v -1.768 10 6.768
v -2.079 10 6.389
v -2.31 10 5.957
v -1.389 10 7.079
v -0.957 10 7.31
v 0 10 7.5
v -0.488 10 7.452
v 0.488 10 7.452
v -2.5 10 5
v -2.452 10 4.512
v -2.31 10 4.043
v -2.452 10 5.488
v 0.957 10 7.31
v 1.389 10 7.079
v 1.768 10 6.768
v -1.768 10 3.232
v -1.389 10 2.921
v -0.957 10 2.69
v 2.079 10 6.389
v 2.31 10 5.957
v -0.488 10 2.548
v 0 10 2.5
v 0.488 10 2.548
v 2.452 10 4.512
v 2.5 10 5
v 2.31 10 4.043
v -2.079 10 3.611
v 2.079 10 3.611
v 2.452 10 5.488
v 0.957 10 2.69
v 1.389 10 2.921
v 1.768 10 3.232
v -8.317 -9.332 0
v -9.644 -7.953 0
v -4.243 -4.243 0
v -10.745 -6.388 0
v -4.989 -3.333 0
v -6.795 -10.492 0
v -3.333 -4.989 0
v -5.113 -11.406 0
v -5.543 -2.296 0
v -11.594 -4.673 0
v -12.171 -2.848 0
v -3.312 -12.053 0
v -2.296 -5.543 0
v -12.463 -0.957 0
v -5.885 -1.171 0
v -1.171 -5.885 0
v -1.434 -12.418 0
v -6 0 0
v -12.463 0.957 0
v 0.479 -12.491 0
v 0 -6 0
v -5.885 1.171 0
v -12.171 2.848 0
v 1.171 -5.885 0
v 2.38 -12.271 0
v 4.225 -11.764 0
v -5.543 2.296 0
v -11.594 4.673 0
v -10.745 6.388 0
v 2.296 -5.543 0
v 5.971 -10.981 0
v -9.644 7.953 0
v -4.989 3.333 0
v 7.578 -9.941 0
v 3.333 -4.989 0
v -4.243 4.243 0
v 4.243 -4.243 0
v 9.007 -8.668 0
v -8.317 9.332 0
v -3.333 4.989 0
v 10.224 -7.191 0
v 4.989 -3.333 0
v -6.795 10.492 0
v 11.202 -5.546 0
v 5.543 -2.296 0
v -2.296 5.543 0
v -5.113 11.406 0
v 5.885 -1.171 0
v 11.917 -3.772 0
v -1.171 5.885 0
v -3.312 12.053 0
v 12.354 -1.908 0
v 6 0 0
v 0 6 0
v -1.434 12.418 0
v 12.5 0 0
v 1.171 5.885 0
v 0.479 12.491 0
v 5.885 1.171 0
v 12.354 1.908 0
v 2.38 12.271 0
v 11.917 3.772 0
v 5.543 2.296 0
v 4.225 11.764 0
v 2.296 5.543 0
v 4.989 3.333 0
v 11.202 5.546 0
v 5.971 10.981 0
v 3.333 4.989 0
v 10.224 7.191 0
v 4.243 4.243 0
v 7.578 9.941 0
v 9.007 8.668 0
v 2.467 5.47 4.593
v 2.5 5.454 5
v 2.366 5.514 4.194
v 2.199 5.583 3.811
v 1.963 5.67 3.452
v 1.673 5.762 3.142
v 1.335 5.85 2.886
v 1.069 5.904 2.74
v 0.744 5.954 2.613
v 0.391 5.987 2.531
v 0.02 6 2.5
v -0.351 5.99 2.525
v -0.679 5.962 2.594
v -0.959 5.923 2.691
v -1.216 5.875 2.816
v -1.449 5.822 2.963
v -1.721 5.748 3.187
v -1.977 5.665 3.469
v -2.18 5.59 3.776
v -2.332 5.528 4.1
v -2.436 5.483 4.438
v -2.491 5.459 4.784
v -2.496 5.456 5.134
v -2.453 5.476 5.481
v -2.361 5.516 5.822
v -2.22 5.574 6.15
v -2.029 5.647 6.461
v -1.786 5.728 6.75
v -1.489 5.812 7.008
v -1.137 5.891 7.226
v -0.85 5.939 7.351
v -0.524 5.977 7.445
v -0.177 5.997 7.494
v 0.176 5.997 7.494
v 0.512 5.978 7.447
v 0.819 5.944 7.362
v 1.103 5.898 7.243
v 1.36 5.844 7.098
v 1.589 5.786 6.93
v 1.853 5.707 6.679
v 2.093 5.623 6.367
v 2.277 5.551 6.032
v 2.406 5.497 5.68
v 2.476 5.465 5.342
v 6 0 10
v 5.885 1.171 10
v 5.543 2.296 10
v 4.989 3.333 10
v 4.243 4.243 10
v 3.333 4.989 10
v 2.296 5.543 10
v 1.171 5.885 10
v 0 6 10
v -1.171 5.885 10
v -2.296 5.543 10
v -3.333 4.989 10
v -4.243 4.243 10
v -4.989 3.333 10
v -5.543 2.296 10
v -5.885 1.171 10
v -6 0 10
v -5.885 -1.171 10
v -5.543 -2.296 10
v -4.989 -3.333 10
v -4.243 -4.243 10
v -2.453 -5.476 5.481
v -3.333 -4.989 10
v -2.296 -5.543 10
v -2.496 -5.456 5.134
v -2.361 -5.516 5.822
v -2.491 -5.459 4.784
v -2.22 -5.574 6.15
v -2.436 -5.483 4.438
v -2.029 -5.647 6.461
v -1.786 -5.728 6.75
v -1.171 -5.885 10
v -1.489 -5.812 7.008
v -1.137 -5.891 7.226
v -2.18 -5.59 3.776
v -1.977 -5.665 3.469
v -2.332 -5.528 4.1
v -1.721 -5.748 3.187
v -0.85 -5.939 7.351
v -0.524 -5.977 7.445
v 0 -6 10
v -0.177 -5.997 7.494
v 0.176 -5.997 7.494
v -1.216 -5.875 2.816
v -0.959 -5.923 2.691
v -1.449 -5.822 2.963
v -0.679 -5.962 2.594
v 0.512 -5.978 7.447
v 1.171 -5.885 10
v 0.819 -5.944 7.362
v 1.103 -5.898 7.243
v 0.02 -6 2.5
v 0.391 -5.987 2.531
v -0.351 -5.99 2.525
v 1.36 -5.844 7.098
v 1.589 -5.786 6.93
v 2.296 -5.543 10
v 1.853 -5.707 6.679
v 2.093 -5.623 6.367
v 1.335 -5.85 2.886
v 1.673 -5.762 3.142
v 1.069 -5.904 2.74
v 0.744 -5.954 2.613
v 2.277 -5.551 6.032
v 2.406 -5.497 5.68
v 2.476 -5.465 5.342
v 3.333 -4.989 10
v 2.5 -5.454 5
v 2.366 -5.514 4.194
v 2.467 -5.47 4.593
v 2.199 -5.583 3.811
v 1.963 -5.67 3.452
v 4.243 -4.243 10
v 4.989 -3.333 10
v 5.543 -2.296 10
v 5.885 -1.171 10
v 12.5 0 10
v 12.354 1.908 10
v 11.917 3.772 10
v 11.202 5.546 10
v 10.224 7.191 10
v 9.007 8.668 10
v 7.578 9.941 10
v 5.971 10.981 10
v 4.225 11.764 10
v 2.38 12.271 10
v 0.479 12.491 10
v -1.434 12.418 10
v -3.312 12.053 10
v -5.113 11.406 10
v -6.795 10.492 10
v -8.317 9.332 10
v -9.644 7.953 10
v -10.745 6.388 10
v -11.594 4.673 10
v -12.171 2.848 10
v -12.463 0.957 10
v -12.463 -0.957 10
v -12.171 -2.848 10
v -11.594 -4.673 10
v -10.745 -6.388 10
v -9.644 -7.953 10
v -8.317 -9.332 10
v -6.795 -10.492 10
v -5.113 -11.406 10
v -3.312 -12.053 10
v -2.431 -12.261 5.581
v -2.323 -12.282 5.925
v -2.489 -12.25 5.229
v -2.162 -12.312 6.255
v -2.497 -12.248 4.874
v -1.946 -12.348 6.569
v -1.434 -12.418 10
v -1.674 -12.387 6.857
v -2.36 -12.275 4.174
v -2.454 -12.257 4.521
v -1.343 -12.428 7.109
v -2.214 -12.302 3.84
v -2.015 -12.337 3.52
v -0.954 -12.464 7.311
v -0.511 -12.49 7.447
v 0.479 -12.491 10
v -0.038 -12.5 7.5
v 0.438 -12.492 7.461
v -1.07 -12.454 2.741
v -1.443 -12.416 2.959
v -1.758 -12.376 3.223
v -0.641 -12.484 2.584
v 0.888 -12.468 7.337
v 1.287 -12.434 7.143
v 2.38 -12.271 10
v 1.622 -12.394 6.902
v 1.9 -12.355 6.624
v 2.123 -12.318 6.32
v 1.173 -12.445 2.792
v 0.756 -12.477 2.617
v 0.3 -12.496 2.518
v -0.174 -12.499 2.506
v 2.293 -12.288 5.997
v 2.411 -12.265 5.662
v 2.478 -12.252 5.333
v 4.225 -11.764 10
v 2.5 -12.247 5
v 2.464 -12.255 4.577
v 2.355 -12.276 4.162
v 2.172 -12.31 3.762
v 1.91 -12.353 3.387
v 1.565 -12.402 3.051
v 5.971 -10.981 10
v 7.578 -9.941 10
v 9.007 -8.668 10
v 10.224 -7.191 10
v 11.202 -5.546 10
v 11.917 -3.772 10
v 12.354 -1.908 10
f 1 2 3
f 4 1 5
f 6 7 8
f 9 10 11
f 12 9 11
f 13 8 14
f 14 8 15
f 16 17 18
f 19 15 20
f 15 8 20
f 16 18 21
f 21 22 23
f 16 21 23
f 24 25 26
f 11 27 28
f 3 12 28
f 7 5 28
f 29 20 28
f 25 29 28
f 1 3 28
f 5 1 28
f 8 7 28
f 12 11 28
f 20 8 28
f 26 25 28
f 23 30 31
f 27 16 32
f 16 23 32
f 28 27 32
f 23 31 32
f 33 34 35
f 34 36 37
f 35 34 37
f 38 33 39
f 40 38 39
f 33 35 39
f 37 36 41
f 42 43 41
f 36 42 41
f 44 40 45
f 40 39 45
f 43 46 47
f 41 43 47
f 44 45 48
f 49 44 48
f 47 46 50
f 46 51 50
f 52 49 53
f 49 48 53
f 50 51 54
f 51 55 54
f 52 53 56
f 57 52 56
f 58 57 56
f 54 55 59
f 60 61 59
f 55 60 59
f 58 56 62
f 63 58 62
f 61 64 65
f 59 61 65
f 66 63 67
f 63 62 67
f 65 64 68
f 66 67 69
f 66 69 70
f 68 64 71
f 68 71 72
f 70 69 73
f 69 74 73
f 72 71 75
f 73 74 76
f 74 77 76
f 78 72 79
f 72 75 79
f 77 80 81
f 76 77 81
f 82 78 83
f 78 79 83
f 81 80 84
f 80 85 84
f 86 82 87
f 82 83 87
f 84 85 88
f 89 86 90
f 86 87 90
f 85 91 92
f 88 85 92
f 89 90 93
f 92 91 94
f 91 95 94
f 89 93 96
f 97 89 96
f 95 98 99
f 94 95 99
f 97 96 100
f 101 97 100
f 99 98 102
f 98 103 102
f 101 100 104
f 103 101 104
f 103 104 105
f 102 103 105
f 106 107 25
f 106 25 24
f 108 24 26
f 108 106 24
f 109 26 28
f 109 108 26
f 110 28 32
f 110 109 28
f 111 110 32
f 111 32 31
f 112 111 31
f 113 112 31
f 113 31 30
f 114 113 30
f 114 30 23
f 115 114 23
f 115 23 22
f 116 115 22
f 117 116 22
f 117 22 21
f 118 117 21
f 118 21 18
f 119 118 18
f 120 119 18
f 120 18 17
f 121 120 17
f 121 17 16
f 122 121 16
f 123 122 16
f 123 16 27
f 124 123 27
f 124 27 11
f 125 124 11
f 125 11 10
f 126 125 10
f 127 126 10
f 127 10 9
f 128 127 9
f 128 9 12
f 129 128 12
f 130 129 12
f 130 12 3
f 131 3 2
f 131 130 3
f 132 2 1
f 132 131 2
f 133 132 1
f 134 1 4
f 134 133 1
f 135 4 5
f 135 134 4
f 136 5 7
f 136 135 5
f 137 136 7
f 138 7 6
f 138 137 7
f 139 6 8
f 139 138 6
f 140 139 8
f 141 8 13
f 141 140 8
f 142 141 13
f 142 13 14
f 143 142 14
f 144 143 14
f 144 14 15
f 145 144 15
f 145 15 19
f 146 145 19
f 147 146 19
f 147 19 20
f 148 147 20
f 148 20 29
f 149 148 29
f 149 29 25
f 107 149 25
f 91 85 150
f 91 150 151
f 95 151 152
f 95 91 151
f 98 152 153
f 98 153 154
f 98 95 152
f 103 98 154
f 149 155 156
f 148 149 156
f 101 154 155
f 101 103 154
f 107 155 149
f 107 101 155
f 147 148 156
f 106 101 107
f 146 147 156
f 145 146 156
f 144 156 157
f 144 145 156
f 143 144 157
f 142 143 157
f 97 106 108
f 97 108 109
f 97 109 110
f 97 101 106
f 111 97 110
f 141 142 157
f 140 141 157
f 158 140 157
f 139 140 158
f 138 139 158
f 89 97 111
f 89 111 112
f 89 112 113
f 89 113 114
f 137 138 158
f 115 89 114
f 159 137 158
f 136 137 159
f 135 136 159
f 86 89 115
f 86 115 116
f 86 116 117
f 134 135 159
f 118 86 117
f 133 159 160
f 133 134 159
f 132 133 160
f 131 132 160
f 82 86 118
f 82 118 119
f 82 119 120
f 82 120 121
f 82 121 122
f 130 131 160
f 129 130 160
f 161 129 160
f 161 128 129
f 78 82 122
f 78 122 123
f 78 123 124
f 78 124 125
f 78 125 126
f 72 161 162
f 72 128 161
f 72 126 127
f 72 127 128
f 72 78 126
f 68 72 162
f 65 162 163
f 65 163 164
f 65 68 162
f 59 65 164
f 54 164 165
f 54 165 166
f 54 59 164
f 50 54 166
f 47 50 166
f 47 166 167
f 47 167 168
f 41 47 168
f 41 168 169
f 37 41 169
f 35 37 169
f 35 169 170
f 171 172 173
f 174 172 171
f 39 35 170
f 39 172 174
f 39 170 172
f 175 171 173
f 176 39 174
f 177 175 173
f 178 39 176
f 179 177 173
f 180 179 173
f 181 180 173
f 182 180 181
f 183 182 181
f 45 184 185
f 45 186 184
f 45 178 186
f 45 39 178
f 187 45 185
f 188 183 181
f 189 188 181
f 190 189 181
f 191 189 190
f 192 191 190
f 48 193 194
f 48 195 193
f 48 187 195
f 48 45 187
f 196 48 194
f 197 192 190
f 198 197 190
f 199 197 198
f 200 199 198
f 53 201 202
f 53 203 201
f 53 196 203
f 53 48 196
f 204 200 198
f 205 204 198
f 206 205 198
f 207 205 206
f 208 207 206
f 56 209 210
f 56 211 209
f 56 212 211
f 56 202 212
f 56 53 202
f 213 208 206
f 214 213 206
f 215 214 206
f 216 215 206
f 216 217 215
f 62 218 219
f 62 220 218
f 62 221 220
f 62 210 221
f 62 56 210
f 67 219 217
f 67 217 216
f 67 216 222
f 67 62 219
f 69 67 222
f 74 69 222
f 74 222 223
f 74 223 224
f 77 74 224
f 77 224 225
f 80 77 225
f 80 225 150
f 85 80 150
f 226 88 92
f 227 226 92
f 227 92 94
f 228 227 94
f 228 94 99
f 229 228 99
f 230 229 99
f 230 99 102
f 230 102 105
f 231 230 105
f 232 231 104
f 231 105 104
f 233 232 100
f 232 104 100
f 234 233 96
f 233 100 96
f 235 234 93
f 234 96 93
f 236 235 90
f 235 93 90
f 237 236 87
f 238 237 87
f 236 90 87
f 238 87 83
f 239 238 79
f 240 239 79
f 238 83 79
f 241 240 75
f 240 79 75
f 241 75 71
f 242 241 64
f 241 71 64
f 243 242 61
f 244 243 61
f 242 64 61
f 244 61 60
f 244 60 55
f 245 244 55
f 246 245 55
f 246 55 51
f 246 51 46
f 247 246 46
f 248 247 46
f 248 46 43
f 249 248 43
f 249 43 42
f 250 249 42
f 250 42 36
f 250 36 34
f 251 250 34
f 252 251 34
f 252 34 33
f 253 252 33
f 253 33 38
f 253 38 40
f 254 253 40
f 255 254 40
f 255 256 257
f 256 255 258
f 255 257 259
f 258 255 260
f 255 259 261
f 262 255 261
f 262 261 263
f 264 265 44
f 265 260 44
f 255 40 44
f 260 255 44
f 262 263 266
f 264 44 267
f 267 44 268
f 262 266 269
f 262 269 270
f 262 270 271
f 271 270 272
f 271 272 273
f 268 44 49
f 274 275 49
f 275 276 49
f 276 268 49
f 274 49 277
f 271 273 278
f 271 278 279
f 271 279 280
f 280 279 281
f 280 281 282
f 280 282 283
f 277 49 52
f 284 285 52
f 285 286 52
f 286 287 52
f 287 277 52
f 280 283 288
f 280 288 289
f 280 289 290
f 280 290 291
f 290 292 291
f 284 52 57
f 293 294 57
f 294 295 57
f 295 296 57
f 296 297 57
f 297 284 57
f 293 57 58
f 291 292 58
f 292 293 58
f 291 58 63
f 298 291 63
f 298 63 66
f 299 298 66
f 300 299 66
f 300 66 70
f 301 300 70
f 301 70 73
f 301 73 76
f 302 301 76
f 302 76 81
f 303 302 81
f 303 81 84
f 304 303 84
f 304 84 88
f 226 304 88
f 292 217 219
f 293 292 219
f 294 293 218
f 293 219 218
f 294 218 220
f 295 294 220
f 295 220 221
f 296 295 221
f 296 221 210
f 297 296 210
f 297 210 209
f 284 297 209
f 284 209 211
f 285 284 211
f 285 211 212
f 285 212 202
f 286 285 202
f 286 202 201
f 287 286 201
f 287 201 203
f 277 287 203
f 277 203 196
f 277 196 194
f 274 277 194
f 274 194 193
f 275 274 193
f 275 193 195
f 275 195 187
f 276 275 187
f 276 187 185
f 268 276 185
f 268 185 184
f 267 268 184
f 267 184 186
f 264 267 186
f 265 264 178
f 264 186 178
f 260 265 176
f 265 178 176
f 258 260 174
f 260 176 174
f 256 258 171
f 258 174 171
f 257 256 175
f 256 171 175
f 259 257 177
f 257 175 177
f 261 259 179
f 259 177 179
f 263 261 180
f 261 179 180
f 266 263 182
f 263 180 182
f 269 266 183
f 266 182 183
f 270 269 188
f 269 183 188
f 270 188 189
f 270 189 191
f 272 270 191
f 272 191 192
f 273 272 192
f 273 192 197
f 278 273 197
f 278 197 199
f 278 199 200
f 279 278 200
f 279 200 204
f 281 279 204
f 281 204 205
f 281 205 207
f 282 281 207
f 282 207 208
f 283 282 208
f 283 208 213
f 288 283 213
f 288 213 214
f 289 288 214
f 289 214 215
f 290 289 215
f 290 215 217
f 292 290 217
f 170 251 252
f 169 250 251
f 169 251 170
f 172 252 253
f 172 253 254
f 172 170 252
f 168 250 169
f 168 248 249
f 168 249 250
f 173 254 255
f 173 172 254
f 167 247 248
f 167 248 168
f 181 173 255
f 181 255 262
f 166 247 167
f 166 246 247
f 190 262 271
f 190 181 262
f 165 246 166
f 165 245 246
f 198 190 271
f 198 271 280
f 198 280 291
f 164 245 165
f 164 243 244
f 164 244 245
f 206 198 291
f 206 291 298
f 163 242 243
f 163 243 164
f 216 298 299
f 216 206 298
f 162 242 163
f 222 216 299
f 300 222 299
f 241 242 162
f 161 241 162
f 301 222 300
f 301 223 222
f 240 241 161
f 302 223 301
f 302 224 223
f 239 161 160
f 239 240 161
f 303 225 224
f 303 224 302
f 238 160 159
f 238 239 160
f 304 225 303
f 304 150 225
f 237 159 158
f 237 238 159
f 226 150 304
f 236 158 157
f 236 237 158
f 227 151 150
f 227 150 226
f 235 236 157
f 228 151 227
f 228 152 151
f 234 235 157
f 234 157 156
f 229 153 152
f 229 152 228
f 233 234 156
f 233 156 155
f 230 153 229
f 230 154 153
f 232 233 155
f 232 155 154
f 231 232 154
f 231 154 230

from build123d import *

# Parameters (mm, degrees)
SKETCH_1_R               = 12.5
SKETCH_1_R_2             = 6
EXTRUDE_1_DEPTH          = 10
SKETCH_2_R               = 2.5
CUT_EXTRUDE_1_DEPTH      = 10
CUT_EXTRUDE_1_DEPTH_BACK = 13.5


with BuildPart() as part:
    # 草图1 → 凸台-拉伸1 (new body)
    with BuildSketch(Plane.XY):
        Circle(SKETCH_1_R)
        Circle(SKETCH_1_R_2, mode=Mode.SUBTRACT)
    extrude(amount=EXTRUDE_1_DEPTH)

    # 草图2 → 切除-拉伸1 (cut, two sides)
    with BuildSketch(Plane(origin=(0, 0, 0), x_dir=(1, 0, 0), z_dir=(0, 1, 0))) as cut_extrude_1_sk:
        with Locations((0, -5)):
            Circle(SKETCH_2_R)
    extrude(amount=CUT_EXTRUDE_1_DEPTH, mode=Mode.SUBTRACT)
    extrude(cut_extrude_1_sk.sketch, amount=-CUT_EXTRUDE_1_DEPTH_BACK, mode=Mode.SUBTRACT)


solid = part.part
